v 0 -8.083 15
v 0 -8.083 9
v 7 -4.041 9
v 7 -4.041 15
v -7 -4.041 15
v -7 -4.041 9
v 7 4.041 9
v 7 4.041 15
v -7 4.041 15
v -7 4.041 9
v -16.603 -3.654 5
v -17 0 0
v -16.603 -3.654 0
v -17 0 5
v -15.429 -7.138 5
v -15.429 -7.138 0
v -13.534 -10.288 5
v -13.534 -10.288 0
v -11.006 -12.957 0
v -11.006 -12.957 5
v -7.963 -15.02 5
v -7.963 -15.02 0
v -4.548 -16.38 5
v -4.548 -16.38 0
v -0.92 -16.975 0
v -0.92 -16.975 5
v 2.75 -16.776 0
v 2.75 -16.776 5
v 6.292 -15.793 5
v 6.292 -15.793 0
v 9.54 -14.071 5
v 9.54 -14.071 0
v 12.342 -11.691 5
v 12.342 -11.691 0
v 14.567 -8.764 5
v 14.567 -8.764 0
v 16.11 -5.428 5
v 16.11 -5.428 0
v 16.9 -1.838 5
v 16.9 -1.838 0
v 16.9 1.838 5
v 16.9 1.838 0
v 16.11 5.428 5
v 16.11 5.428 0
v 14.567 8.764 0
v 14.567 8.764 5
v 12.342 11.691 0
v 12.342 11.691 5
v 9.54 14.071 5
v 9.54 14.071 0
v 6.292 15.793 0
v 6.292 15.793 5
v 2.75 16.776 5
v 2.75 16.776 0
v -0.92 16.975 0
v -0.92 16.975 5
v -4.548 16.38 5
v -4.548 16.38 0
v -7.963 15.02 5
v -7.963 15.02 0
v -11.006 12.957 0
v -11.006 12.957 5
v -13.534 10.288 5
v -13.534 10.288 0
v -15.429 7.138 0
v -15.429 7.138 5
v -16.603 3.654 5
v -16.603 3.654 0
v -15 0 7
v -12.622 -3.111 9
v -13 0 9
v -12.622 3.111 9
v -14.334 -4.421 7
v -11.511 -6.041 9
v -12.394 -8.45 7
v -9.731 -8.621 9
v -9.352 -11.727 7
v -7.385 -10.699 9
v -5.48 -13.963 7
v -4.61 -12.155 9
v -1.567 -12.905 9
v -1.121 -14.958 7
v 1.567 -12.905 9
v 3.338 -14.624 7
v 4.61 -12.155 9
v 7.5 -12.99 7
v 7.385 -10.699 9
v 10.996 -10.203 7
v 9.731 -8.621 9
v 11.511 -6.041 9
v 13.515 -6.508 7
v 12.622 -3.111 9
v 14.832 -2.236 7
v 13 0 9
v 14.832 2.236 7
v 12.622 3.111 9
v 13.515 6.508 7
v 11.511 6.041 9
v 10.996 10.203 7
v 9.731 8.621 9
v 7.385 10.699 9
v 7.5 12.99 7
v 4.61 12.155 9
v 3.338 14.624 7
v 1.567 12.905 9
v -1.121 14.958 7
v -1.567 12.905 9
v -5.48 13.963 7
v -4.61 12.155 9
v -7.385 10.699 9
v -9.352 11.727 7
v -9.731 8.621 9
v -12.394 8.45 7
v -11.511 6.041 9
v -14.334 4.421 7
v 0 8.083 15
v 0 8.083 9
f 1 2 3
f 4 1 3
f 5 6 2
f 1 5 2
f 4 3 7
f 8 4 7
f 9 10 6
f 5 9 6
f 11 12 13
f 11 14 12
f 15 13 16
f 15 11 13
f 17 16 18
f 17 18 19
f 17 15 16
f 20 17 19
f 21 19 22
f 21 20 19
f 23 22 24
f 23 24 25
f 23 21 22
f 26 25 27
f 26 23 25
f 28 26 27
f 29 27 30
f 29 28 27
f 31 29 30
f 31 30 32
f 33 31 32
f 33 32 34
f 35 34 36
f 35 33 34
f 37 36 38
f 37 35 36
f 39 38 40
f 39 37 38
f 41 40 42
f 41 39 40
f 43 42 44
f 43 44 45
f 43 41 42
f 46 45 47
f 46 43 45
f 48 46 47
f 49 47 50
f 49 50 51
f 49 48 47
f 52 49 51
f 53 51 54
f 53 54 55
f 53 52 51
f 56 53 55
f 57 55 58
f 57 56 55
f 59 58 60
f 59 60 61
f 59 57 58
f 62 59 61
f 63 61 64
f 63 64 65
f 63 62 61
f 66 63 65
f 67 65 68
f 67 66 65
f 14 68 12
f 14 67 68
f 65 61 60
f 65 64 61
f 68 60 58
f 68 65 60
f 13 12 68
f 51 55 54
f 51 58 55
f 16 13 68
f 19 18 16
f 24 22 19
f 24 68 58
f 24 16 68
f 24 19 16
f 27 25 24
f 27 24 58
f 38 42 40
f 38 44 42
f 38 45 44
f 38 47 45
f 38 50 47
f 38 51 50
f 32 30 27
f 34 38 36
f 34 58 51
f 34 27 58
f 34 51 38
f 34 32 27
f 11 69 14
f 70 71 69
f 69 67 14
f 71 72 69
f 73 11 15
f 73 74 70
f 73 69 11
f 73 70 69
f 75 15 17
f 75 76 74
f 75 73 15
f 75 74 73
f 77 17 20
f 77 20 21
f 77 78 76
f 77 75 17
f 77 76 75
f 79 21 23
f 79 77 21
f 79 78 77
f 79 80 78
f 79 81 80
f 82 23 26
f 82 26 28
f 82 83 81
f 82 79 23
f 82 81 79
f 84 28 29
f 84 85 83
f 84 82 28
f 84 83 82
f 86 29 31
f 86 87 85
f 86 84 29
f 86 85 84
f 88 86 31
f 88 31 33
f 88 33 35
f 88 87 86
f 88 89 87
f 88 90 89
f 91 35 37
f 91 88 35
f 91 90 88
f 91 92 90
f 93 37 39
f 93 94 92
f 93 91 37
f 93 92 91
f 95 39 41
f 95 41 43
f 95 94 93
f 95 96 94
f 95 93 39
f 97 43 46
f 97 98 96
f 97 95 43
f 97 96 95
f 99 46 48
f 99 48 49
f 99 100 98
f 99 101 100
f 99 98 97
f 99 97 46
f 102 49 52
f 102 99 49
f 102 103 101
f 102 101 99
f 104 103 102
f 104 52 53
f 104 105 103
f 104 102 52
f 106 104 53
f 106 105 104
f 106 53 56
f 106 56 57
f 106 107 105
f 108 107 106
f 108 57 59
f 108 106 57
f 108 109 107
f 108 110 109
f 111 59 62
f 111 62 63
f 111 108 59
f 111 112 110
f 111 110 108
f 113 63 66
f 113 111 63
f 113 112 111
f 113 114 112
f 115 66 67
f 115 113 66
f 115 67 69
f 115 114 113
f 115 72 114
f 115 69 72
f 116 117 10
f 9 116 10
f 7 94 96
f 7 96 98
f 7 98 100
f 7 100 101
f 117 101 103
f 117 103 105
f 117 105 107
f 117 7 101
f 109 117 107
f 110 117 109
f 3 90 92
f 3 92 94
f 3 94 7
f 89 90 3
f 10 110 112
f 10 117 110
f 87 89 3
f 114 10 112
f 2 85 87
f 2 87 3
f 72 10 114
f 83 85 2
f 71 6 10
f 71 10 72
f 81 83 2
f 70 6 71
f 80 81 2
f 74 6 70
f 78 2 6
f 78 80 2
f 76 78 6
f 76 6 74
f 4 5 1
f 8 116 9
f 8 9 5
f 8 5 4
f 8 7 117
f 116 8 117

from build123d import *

# Parameters (mm, degrees)
EXTRUDE_START   = 9
EXTRUDE_1_DEPTH = 6


with BuildPart() as part:
    # Revolve profile 1 → Revolve 1 (revolve)
    with BuildSketch(Plane(origin=(0, 0, 0), x_dir=(1, 0, 0), z_dir=(0, 1, 0))):
        Polygon((0, 0), (17, 0), (17, -5), (13, -9), (0, -9), align=None)
    revolve(axis=Axis((0, 0, -5), (0, 0, 1)))


with BuildPart() as body_2:
    # Extrude sketch 1 → Extrude 1 (new body)
    with BuildSketch(Plane.XY.offset(EXTRUDE_START)):
        Polygon((7, 4.041451884), (0, 8.082903769), (-7, 4.041451884), (-7, -4.041451884), (0, -8.082903769), (7, -4.041451884), align=None)
    extrude(amount=EXTRUDE_1_DEPTH)


with BuildPart() as part_1:
    add(part.part)

    # Combine (weld / assembly of features): union body 2
    add(body_2.part)


solid = part_1.part
